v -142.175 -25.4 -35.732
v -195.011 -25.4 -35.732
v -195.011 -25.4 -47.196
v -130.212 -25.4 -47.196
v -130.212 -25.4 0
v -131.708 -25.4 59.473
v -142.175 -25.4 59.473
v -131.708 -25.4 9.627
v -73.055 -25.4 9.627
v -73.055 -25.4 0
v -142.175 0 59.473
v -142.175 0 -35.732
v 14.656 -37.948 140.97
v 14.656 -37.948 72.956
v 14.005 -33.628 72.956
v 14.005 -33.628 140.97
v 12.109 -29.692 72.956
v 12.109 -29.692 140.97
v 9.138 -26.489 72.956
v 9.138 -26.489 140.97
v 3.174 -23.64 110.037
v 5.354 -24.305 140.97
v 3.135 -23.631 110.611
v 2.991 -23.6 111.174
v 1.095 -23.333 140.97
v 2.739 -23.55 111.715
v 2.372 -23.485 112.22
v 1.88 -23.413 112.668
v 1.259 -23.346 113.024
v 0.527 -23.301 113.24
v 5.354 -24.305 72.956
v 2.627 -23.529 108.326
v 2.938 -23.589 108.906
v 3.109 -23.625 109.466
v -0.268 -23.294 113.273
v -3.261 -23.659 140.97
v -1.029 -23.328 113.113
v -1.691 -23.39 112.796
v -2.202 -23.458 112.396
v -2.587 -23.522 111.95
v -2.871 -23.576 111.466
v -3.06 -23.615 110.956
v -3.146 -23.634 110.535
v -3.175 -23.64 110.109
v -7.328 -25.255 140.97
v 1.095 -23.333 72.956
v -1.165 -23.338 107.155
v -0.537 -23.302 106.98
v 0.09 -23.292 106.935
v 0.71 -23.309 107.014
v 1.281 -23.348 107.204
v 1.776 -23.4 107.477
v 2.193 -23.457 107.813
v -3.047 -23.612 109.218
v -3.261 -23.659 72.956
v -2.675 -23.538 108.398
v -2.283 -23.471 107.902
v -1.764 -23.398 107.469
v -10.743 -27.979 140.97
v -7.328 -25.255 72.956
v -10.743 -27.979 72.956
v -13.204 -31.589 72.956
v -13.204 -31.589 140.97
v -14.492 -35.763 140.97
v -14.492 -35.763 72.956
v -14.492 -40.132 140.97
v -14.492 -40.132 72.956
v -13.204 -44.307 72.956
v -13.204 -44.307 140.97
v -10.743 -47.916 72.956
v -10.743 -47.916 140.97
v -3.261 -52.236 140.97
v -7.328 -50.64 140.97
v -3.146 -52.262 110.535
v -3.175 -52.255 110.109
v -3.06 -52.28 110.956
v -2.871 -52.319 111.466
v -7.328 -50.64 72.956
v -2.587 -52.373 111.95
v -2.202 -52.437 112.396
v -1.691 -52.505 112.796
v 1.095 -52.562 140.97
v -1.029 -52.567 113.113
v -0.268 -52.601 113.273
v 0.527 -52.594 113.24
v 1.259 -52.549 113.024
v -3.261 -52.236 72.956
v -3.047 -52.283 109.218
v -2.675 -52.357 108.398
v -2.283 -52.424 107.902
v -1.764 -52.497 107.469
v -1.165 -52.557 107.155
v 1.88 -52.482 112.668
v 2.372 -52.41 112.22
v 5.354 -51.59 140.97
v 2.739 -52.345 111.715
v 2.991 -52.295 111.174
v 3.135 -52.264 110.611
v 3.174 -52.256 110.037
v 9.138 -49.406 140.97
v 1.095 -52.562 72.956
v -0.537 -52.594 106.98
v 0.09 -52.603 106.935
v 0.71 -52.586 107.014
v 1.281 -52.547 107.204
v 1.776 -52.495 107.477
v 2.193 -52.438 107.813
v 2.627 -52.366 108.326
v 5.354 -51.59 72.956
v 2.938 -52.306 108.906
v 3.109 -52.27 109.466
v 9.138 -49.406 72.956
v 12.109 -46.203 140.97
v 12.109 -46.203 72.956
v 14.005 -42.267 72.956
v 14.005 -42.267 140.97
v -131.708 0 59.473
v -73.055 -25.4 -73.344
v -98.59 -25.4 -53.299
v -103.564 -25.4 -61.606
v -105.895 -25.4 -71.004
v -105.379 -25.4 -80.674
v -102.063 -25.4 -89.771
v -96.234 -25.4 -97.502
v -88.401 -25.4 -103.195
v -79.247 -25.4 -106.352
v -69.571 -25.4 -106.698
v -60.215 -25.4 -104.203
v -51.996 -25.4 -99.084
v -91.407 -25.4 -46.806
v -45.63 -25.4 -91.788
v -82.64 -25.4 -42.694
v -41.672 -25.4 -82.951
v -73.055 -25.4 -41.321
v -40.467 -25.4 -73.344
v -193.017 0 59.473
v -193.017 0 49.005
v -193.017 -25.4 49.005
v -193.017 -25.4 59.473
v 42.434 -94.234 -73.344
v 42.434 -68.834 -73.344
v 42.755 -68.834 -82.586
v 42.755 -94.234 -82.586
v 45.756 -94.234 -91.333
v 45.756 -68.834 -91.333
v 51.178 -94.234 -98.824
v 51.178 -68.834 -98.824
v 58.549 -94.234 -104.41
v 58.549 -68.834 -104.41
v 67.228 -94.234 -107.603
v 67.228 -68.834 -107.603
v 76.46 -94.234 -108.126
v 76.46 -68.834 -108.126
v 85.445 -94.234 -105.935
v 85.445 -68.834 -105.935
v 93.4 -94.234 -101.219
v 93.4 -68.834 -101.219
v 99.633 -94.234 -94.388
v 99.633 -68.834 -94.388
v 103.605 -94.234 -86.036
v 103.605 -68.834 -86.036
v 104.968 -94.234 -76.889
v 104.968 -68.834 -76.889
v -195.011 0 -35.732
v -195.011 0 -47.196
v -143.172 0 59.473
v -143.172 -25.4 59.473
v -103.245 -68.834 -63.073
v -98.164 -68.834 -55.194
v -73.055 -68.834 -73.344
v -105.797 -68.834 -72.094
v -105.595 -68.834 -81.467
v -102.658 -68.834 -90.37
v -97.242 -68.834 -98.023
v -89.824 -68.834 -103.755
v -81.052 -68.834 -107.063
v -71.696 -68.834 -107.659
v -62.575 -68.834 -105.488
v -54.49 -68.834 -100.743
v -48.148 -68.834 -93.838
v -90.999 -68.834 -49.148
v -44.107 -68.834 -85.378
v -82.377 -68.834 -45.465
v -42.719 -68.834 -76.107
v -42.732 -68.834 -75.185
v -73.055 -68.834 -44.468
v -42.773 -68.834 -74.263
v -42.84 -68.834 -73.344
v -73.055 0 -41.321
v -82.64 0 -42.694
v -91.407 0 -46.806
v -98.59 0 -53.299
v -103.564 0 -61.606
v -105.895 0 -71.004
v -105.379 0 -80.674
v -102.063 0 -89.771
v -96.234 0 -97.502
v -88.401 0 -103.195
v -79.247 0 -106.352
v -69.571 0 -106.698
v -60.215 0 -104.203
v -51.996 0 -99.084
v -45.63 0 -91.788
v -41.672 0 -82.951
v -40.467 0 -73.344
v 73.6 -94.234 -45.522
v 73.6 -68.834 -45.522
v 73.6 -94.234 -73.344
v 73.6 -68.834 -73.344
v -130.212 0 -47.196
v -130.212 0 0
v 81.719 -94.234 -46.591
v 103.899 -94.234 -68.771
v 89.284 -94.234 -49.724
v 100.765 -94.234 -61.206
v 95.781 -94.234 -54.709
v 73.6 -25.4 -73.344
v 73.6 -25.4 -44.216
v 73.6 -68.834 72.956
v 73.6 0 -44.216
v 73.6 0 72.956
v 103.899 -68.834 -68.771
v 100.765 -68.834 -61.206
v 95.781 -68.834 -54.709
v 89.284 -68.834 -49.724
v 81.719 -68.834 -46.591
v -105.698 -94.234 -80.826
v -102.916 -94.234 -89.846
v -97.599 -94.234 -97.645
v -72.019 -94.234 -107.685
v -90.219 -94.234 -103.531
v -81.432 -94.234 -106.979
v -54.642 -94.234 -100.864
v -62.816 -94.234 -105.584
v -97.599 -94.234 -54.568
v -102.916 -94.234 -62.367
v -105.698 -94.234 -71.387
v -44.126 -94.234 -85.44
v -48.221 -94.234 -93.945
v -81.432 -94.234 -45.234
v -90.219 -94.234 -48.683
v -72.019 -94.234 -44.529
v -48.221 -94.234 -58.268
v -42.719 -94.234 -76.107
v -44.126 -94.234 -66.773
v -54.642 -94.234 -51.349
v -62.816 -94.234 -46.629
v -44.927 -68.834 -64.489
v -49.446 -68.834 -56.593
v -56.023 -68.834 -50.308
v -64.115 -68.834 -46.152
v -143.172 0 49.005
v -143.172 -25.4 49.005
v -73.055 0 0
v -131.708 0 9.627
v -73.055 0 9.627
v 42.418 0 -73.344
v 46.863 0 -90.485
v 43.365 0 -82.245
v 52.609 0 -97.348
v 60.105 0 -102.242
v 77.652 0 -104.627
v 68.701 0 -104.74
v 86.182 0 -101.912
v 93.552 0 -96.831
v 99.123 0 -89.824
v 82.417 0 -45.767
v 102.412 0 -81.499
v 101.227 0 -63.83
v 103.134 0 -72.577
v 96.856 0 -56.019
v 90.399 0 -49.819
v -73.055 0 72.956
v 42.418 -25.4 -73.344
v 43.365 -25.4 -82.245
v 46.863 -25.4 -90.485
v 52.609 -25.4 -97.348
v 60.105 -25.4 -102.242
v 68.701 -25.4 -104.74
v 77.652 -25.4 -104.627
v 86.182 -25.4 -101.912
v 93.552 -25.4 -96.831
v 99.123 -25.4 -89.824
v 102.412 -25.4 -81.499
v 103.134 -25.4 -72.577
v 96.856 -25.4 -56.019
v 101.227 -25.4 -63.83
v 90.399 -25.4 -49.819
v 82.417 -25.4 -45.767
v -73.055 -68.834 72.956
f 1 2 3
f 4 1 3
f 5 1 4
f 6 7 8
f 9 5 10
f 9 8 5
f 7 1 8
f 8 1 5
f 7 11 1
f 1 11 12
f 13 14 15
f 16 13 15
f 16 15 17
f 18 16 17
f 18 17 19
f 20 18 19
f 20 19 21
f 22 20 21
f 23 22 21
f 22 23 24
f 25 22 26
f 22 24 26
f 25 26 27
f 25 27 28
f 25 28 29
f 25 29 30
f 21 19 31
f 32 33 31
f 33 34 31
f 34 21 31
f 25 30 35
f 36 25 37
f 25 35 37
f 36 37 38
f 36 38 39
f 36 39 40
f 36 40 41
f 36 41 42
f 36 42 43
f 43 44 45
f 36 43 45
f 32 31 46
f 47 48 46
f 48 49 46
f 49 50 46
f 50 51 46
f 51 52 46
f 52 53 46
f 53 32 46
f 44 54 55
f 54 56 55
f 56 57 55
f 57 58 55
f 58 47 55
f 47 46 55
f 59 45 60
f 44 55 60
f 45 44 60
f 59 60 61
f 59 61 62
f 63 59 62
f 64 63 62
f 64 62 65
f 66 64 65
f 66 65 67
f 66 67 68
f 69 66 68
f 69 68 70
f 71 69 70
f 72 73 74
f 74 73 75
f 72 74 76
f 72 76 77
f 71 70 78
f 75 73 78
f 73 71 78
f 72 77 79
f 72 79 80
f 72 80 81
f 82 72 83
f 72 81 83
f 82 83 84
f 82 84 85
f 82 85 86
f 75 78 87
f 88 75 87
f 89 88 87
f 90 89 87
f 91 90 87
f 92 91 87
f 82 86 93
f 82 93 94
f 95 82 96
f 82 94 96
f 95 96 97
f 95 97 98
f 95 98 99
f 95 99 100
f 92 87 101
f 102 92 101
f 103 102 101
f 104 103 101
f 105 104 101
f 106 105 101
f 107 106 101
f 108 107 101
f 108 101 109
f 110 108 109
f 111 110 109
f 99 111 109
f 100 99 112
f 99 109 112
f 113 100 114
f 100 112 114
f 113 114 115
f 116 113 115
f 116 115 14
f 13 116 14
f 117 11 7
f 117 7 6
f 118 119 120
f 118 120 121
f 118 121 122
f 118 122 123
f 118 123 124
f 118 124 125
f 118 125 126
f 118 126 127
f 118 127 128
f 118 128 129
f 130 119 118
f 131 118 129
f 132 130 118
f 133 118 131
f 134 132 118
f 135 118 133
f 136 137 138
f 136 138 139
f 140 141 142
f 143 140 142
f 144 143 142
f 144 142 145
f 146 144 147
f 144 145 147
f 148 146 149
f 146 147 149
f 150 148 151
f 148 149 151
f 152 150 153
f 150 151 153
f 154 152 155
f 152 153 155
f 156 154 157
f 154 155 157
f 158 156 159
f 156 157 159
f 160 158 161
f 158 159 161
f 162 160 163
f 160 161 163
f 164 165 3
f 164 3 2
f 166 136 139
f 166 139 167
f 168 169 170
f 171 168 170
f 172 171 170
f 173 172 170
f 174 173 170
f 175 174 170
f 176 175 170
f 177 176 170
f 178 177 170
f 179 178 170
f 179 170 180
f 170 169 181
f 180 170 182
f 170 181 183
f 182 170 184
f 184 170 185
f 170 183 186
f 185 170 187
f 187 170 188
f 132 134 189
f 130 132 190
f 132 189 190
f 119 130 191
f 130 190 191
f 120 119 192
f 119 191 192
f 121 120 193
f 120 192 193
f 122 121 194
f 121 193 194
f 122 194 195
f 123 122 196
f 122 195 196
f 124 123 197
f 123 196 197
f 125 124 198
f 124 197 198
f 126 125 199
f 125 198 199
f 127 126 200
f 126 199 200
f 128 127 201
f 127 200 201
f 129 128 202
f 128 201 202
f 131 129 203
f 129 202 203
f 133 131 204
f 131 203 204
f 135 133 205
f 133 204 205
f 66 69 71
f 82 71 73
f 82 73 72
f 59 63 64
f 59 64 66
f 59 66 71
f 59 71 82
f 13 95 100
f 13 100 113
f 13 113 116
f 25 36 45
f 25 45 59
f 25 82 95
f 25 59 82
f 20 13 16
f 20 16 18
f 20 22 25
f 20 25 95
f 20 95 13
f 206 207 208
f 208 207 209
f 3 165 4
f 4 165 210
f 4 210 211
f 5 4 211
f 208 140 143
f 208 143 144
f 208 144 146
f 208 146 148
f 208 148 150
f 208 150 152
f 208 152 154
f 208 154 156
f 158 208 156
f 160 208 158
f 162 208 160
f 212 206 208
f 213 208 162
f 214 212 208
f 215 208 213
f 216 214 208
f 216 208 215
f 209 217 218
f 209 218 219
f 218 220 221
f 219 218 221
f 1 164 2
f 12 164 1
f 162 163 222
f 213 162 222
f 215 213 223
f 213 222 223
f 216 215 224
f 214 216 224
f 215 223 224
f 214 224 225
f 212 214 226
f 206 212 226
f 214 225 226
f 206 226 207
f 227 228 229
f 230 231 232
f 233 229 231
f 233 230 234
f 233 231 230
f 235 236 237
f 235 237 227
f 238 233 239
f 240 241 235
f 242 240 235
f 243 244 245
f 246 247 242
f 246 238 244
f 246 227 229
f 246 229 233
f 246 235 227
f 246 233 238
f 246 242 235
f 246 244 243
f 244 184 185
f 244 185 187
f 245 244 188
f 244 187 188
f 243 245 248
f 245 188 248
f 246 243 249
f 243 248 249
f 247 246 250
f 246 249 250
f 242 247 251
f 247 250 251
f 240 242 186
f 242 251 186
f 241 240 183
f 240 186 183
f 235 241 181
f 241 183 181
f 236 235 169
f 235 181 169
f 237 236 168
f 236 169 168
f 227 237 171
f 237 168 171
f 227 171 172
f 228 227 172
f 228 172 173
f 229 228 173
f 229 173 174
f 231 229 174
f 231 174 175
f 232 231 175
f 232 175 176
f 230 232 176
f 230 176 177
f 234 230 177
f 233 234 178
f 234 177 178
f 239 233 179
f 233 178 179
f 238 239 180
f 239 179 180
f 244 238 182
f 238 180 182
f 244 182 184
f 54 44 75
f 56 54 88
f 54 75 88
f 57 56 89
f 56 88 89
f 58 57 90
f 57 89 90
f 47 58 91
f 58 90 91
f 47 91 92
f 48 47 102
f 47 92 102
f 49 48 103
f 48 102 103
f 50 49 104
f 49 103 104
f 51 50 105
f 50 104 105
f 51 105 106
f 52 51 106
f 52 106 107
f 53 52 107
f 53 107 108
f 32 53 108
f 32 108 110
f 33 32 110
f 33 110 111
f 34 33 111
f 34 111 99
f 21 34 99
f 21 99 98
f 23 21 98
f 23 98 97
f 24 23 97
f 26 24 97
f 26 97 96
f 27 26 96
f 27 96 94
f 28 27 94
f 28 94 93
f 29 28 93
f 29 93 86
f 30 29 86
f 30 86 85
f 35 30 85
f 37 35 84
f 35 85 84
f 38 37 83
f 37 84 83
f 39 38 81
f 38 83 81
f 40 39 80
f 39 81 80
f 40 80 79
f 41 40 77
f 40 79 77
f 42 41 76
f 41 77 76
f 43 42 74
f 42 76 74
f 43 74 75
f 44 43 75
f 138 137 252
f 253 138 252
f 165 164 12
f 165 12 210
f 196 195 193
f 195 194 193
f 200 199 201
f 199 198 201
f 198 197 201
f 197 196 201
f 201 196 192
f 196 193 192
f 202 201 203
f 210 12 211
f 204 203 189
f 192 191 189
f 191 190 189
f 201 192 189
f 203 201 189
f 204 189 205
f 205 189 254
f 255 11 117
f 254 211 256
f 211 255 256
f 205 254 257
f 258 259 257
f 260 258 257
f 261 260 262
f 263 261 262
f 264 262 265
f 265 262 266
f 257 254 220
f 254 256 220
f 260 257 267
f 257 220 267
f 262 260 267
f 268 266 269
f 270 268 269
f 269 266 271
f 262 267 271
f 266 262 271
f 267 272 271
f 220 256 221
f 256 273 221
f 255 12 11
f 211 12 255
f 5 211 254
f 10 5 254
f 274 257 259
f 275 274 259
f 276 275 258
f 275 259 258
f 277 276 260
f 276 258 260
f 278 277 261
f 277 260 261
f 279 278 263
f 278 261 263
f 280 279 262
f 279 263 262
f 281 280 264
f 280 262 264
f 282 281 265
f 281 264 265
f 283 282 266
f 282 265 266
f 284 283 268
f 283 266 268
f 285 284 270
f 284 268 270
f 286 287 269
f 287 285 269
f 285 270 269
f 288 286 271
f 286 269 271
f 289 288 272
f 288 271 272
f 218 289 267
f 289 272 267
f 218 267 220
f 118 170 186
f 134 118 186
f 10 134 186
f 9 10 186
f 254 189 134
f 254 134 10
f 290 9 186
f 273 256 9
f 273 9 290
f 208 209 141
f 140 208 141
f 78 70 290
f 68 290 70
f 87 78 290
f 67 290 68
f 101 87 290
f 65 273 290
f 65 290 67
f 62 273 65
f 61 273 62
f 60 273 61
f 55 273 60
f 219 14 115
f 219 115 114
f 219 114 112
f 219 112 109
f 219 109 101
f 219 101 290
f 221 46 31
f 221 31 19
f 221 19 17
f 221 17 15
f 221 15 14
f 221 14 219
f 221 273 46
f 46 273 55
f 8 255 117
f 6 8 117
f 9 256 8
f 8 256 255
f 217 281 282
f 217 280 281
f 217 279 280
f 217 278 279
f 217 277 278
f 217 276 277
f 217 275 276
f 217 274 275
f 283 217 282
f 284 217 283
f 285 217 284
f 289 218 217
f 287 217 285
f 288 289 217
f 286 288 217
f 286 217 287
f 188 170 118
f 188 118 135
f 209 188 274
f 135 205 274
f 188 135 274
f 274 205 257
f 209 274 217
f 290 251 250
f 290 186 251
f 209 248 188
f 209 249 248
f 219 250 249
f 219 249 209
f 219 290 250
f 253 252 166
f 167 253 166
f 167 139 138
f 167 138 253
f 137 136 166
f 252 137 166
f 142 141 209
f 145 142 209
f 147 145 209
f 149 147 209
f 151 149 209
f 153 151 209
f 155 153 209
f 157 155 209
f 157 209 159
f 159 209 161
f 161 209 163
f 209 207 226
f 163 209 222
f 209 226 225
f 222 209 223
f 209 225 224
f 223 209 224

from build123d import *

# Parameters (mm, degrees)
F0_W      = 146.6556340456
F0_H      = 146.2992727757
F1_DEPTH  = 68.834
F2_R      = 14.6557802675
F3_DEPTH  = 140.97
F5_D      = 6.35
F7_R      = 31.6665233441
F8_DEPTH  = 25.4
F9_DEPTH  = 25.4
F10_R     = 30.4056844506
F10_R_2   = 32.7920406296
F11_DEPTH = 25.4
F12_W     = 10.4675292969
F12_H     = 49.845370464
F12_W_2   = 52.8360903263
F12_H_2   = 11.4644356072
F13_DEPTH = 25.4
F12_W_3   = 49.8453676701
F12_H_3   = 10.4675255716


with BuildPart() as f1:
    # F0 (on Front) → F1 (new body)
    with BuildSketch(Plane.XZ):
        with Locations((0.2725943923, -0.19390136)):
            Rectangle(F0_W, F0_H)
    extrude(amount=F1_DEPTH)

    # F2 (on Top) → F3 (join)
    with BuildSketch(Plane.XY):
        with Locations((0, -37.9476025701)):
            Circle(F2_R)
    extrude(amount=F3_DEPTH)

    # F5 (through all)
    with Locations(Plane(origin=(0, 0, 0), x_dir=(1, 0, 0), z_dir=(0, 1, 0))):
        with Locations((0, -110.1090013981)):
            Hole(F5_D / 2)

    # F7 (on face) → F8 (join)
    with BuildSketch(Plane.XZ.offset(68.834)):
        with Locations((-74.3853971362, -76.1065930128)):
            Circle(F7_R)
    extrude(amount=F8_DEPTH)

    # F10 (on Front) → F11 (join)
    with BuildSketch(Plane.XZ):
        with Locations((72.7967619896, -74.6112391353)):
            Circle(F10_R)
        with Locations((-73.250181973, -74.1127803922)):
            Circle(F10_R_2)
    extrude(amount=F11_DEPTH)

    # F12 (on Front) → F13 (join)
    with BuildSketch(Plane.XZ):
        Polygon((-130.2122175694, 0), (-72.3915845156, 0), (-72.3915845156, 9.6274474636), (-131.7075788975, 9.6274474636), (-142.1751081944, 9.6274474636), (-142.1751081944, 0), align=None)
        Polygon((-130.2122175694, -47.1962802112), (-130.2122175694, 0), (-142.1751081944, 0), (-142.1751081944, -35.731844604), (-142.1751081944, -47.1962802112), align=None)
        with Locations((-136.9413435459, 34.5501326956)):
            Rectangle(F12_W, F12_H)
        with Locations((-168.5931533575, -41.4640624076)):
            Rectangle(F12_W_2, F12_H_2)
    extrude(amount=F13_DEPTH)


with BuildPart() as f9:
    # F6 (on face) → F9 (new body)
    with BuildSketch(Plane.XZ.offset(68.834)):
        with BuildLine():
            ThreePointArc((42.4340785854, -73.3435377479), (71.8246008307, -108.2065568723), (104.9678130656, -76.889462769))
            ThreePointArc((104.9678130656, -76.889462769), (95.7805138304, -54.7093603538), (73.6004114151, -45.5220611185))
            Line((73.6004114151, -45.5220611185), (73.6004114151, -73.3435377479))
            Line((73.6004114151, -73.3435377479), (42.4340785854, -73.3435377479))
        make_face()
    extrude(amount=F9_DEPTH)


with BuildPart() as f13:
    # F12 (on Front) → F13, piece 2 (new body)
    with BuildSketch(Plane.XZ):
        with Locations((-168.0946946144, 54.2390551418)):
            Rectangle(F12_W_3, F12_H_3)
    extrude(amount=F13_DEPTH)


solid = Compound([f1.part, f9.part, f13.part])
